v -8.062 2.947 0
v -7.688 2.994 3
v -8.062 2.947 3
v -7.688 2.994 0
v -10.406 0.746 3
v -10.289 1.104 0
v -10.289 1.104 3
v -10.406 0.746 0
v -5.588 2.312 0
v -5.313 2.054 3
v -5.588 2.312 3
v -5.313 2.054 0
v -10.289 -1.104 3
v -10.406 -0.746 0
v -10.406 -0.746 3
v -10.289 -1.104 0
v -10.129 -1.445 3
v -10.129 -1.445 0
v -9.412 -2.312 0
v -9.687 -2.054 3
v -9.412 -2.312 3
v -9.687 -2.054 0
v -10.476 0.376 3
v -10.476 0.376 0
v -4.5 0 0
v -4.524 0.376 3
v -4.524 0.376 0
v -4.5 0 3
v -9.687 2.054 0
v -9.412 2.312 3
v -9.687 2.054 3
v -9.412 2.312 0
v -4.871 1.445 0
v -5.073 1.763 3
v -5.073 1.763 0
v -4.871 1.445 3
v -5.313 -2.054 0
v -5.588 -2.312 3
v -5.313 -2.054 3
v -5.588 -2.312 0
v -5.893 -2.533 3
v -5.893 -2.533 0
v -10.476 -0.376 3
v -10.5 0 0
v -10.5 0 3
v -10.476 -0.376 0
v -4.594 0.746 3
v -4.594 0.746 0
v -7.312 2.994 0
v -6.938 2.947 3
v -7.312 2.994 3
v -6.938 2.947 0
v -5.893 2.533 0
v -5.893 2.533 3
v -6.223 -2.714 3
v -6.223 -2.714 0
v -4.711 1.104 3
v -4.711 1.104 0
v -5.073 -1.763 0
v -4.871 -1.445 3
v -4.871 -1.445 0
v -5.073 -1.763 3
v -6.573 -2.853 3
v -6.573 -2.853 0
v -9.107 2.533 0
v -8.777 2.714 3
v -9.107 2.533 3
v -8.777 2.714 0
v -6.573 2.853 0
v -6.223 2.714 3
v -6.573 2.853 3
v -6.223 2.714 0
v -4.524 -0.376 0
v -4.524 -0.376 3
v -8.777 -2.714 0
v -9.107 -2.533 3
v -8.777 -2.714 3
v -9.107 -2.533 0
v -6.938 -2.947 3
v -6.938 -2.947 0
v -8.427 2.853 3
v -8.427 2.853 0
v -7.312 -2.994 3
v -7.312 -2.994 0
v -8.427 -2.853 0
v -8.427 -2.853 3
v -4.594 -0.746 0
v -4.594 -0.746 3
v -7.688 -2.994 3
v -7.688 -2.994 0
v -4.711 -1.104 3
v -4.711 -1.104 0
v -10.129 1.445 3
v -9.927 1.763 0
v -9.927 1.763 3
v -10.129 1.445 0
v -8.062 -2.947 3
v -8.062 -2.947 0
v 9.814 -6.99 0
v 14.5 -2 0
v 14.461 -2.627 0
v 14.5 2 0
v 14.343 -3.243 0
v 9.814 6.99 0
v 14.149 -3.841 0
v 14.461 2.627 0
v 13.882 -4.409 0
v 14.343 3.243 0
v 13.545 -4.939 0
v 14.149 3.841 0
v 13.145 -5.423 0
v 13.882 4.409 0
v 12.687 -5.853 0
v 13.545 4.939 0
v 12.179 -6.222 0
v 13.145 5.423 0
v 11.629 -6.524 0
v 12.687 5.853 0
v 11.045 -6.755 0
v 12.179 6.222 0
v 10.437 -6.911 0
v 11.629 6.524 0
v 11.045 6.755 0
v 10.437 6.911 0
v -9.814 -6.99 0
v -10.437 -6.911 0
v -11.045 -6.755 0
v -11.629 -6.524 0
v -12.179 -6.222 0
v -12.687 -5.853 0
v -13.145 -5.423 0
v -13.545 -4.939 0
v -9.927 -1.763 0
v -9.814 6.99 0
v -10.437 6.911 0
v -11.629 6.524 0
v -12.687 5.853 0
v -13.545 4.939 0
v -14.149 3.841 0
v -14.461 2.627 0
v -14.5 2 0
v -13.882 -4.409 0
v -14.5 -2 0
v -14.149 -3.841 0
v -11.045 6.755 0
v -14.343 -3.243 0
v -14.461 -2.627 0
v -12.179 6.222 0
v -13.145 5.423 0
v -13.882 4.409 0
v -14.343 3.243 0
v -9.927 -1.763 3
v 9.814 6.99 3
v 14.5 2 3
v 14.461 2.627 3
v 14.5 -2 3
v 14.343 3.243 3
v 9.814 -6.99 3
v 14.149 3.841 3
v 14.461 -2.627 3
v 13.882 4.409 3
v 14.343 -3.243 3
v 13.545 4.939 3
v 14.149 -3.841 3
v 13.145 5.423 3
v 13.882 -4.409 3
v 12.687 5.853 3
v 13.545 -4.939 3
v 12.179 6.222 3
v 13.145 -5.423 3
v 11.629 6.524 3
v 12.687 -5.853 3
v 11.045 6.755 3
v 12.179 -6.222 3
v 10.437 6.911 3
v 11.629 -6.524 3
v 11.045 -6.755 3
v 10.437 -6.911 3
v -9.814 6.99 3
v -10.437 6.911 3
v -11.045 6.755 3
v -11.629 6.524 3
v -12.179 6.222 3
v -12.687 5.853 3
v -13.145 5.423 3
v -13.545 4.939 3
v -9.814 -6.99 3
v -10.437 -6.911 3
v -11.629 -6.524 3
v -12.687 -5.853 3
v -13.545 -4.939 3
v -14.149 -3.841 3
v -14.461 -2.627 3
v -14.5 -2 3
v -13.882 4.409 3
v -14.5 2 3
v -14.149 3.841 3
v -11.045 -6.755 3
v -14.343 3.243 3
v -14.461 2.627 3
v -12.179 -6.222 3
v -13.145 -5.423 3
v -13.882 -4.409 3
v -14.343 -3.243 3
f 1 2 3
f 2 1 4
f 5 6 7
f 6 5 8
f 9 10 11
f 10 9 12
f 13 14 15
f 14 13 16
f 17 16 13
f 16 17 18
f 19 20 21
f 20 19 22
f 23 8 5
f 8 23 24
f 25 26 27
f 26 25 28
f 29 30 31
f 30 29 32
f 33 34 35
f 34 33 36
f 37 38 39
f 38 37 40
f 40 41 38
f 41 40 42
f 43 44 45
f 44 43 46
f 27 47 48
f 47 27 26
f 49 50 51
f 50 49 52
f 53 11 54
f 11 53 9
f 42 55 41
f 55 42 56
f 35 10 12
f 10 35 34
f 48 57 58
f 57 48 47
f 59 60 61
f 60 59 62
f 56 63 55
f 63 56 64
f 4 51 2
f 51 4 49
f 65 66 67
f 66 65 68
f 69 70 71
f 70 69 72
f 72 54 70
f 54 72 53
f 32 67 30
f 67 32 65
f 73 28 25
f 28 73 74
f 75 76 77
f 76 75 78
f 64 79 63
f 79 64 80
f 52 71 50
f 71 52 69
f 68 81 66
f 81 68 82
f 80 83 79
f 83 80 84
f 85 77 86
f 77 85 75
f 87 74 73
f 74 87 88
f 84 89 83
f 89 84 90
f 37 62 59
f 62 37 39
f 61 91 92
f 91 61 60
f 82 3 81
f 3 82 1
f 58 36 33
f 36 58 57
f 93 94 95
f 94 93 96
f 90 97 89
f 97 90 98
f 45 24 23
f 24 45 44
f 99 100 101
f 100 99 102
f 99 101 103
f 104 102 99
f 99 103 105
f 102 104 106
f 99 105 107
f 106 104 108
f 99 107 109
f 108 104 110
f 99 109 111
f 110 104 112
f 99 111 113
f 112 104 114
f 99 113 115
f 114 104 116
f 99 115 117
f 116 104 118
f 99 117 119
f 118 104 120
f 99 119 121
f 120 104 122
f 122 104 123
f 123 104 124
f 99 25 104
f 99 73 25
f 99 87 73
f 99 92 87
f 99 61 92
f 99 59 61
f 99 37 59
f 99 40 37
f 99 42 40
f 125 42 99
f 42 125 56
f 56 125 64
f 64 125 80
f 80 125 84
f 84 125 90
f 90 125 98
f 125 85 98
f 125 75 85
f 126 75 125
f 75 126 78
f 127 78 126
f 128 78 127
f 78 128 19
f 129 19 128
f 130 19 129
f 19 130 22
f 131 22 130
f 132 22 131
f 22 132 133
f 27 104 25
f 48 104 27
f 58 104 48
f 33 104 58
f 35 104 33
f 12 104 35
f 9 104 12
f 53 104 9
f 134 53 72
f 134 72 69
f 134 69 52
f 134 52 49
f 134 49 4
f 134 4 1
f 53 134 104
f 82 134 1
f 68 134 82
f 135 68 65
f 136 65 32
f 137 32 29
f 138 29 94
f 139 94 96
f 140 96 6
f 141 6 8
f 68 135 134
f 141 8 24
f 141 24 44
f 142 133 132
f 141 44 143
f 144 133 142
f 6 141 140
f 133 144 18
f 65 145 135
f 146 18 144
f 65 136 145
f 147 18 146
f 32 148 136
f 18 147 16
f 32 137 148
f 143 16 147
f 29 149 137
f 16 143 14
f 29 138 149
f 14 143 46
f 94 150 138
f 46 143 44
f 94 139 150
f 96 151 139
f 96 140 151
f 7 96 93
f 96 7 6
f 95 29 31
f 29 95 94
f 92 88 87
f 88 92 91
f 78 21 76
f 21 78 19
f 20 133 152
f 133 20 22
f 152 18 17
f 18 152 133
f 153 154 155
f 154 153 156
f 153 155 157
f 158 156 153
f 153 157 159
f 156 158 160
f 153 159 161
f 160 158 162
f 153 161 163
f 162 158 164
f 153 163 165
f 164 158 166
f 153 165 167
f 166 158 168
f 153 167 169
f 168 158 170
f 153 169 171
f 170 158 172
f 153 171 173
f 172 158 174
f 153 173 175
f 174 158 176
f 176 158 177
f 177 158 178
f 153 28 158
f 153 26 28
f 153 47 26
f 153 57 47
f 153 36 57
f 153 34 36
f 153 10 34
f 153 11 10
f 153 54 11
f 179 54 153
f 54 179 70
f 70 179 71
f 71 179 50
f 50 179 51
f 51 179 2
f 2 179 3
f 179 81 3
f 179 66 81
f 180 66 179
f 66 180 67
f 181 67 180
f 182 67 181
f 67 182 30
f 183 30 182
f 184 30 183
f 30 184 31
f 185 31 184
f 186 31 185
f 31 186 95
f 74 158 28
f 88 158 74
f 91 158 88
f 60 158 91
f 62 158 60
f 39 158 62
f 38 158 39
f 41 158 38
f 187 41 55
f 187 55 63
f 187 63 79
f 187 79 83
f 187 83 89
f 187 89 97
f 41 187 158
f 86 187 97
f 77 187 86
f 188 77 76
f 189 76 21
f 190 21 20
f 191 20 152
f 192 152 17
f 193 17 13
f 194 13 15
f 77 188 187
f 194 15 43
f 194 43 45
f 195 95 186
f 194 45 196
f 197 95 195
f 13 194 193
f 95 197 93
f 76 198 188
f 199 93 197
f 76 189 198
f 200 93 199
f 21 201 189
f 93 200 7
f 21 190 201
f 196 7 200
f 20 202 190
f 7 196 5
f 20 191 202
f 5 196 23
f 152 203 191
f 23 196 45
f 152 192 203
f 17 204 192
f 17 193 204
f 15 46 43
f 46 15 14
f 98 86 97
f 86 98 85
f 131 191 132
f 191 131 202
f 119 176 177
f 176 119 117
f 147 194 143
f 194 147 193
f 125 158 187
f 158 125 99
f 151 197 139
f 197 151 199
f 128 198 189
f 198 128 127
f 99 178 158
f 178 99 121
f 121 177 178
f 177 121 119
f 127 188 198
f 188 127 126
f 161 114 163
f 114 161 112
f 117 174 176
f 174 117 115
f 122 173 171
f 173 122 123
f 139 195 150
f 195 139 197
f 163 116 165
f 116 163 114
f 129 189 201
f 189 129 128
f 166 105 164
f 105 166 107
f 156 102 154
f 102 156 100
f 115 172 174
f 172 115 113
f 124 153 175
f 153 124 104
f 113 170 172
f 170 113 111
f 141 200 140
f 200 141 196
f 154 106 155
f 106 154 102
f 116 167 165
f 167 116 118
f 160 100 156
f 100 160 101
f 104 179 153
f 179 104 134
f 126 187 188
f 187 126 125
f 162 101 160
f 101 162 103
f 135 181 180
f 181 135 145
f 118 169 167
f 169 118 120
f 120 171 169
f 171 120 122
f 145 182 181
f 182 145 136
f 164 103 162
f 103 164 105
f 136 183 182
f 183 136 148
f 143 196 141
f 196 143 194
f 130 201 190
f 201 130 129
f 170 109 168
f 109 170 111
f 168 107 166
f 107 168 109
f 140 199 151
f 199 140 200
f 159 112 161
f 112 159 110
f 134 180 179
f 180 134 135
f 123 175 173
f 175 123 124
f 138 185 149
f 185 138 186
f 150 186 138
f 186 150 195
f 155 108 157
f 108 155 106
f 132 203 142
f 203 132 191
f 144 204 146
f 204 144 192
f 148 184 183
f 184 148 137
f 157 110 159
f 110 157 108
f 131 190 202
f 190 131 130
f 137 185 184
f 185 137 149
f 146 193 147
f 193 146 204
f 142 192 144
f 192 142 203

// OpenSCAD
$fn = 50;


difference() {
	union() {
		hull() {
			translate(v = [-9.5000000000, 2.0000000000, 0]) {
				cylinder(h = 3, r = 5);
			}
			translate(v = [9.5000000000, 2.0000000000, 0]) {
				cylinder(h = 3, r = 5);
			}
			translate(v = [-9.5000000000, -2.0000000000, 0]) {
				cylinder(h = 3, r = 5);
			}
			translate(v = [9.5000000000, -2.0000000000, 0]) {
				cylinder(h = 3, r = 5);
			}
		}
	}
	union() {
		translate(v = [-7.5000000000, 0.0000000000, 0]) {
			cylinder(h = 3, r = 3.0000000000);
		}
		translate(v = [-7.5000000000, 0.0000000000, 0]) {
			cylinder(h = 3, r = 1.5000000000);
		}
		translate(v = [-7.5000000000, 0.0000000000, 0]) {
			cylinder(h = 3, r = 1.5000000000);
		}
		translate(v = [-7.5000000000, 0.0000000000, 0]) {
			cylinder(h = 3, r = 1.5000000000);
		}
	}
}
